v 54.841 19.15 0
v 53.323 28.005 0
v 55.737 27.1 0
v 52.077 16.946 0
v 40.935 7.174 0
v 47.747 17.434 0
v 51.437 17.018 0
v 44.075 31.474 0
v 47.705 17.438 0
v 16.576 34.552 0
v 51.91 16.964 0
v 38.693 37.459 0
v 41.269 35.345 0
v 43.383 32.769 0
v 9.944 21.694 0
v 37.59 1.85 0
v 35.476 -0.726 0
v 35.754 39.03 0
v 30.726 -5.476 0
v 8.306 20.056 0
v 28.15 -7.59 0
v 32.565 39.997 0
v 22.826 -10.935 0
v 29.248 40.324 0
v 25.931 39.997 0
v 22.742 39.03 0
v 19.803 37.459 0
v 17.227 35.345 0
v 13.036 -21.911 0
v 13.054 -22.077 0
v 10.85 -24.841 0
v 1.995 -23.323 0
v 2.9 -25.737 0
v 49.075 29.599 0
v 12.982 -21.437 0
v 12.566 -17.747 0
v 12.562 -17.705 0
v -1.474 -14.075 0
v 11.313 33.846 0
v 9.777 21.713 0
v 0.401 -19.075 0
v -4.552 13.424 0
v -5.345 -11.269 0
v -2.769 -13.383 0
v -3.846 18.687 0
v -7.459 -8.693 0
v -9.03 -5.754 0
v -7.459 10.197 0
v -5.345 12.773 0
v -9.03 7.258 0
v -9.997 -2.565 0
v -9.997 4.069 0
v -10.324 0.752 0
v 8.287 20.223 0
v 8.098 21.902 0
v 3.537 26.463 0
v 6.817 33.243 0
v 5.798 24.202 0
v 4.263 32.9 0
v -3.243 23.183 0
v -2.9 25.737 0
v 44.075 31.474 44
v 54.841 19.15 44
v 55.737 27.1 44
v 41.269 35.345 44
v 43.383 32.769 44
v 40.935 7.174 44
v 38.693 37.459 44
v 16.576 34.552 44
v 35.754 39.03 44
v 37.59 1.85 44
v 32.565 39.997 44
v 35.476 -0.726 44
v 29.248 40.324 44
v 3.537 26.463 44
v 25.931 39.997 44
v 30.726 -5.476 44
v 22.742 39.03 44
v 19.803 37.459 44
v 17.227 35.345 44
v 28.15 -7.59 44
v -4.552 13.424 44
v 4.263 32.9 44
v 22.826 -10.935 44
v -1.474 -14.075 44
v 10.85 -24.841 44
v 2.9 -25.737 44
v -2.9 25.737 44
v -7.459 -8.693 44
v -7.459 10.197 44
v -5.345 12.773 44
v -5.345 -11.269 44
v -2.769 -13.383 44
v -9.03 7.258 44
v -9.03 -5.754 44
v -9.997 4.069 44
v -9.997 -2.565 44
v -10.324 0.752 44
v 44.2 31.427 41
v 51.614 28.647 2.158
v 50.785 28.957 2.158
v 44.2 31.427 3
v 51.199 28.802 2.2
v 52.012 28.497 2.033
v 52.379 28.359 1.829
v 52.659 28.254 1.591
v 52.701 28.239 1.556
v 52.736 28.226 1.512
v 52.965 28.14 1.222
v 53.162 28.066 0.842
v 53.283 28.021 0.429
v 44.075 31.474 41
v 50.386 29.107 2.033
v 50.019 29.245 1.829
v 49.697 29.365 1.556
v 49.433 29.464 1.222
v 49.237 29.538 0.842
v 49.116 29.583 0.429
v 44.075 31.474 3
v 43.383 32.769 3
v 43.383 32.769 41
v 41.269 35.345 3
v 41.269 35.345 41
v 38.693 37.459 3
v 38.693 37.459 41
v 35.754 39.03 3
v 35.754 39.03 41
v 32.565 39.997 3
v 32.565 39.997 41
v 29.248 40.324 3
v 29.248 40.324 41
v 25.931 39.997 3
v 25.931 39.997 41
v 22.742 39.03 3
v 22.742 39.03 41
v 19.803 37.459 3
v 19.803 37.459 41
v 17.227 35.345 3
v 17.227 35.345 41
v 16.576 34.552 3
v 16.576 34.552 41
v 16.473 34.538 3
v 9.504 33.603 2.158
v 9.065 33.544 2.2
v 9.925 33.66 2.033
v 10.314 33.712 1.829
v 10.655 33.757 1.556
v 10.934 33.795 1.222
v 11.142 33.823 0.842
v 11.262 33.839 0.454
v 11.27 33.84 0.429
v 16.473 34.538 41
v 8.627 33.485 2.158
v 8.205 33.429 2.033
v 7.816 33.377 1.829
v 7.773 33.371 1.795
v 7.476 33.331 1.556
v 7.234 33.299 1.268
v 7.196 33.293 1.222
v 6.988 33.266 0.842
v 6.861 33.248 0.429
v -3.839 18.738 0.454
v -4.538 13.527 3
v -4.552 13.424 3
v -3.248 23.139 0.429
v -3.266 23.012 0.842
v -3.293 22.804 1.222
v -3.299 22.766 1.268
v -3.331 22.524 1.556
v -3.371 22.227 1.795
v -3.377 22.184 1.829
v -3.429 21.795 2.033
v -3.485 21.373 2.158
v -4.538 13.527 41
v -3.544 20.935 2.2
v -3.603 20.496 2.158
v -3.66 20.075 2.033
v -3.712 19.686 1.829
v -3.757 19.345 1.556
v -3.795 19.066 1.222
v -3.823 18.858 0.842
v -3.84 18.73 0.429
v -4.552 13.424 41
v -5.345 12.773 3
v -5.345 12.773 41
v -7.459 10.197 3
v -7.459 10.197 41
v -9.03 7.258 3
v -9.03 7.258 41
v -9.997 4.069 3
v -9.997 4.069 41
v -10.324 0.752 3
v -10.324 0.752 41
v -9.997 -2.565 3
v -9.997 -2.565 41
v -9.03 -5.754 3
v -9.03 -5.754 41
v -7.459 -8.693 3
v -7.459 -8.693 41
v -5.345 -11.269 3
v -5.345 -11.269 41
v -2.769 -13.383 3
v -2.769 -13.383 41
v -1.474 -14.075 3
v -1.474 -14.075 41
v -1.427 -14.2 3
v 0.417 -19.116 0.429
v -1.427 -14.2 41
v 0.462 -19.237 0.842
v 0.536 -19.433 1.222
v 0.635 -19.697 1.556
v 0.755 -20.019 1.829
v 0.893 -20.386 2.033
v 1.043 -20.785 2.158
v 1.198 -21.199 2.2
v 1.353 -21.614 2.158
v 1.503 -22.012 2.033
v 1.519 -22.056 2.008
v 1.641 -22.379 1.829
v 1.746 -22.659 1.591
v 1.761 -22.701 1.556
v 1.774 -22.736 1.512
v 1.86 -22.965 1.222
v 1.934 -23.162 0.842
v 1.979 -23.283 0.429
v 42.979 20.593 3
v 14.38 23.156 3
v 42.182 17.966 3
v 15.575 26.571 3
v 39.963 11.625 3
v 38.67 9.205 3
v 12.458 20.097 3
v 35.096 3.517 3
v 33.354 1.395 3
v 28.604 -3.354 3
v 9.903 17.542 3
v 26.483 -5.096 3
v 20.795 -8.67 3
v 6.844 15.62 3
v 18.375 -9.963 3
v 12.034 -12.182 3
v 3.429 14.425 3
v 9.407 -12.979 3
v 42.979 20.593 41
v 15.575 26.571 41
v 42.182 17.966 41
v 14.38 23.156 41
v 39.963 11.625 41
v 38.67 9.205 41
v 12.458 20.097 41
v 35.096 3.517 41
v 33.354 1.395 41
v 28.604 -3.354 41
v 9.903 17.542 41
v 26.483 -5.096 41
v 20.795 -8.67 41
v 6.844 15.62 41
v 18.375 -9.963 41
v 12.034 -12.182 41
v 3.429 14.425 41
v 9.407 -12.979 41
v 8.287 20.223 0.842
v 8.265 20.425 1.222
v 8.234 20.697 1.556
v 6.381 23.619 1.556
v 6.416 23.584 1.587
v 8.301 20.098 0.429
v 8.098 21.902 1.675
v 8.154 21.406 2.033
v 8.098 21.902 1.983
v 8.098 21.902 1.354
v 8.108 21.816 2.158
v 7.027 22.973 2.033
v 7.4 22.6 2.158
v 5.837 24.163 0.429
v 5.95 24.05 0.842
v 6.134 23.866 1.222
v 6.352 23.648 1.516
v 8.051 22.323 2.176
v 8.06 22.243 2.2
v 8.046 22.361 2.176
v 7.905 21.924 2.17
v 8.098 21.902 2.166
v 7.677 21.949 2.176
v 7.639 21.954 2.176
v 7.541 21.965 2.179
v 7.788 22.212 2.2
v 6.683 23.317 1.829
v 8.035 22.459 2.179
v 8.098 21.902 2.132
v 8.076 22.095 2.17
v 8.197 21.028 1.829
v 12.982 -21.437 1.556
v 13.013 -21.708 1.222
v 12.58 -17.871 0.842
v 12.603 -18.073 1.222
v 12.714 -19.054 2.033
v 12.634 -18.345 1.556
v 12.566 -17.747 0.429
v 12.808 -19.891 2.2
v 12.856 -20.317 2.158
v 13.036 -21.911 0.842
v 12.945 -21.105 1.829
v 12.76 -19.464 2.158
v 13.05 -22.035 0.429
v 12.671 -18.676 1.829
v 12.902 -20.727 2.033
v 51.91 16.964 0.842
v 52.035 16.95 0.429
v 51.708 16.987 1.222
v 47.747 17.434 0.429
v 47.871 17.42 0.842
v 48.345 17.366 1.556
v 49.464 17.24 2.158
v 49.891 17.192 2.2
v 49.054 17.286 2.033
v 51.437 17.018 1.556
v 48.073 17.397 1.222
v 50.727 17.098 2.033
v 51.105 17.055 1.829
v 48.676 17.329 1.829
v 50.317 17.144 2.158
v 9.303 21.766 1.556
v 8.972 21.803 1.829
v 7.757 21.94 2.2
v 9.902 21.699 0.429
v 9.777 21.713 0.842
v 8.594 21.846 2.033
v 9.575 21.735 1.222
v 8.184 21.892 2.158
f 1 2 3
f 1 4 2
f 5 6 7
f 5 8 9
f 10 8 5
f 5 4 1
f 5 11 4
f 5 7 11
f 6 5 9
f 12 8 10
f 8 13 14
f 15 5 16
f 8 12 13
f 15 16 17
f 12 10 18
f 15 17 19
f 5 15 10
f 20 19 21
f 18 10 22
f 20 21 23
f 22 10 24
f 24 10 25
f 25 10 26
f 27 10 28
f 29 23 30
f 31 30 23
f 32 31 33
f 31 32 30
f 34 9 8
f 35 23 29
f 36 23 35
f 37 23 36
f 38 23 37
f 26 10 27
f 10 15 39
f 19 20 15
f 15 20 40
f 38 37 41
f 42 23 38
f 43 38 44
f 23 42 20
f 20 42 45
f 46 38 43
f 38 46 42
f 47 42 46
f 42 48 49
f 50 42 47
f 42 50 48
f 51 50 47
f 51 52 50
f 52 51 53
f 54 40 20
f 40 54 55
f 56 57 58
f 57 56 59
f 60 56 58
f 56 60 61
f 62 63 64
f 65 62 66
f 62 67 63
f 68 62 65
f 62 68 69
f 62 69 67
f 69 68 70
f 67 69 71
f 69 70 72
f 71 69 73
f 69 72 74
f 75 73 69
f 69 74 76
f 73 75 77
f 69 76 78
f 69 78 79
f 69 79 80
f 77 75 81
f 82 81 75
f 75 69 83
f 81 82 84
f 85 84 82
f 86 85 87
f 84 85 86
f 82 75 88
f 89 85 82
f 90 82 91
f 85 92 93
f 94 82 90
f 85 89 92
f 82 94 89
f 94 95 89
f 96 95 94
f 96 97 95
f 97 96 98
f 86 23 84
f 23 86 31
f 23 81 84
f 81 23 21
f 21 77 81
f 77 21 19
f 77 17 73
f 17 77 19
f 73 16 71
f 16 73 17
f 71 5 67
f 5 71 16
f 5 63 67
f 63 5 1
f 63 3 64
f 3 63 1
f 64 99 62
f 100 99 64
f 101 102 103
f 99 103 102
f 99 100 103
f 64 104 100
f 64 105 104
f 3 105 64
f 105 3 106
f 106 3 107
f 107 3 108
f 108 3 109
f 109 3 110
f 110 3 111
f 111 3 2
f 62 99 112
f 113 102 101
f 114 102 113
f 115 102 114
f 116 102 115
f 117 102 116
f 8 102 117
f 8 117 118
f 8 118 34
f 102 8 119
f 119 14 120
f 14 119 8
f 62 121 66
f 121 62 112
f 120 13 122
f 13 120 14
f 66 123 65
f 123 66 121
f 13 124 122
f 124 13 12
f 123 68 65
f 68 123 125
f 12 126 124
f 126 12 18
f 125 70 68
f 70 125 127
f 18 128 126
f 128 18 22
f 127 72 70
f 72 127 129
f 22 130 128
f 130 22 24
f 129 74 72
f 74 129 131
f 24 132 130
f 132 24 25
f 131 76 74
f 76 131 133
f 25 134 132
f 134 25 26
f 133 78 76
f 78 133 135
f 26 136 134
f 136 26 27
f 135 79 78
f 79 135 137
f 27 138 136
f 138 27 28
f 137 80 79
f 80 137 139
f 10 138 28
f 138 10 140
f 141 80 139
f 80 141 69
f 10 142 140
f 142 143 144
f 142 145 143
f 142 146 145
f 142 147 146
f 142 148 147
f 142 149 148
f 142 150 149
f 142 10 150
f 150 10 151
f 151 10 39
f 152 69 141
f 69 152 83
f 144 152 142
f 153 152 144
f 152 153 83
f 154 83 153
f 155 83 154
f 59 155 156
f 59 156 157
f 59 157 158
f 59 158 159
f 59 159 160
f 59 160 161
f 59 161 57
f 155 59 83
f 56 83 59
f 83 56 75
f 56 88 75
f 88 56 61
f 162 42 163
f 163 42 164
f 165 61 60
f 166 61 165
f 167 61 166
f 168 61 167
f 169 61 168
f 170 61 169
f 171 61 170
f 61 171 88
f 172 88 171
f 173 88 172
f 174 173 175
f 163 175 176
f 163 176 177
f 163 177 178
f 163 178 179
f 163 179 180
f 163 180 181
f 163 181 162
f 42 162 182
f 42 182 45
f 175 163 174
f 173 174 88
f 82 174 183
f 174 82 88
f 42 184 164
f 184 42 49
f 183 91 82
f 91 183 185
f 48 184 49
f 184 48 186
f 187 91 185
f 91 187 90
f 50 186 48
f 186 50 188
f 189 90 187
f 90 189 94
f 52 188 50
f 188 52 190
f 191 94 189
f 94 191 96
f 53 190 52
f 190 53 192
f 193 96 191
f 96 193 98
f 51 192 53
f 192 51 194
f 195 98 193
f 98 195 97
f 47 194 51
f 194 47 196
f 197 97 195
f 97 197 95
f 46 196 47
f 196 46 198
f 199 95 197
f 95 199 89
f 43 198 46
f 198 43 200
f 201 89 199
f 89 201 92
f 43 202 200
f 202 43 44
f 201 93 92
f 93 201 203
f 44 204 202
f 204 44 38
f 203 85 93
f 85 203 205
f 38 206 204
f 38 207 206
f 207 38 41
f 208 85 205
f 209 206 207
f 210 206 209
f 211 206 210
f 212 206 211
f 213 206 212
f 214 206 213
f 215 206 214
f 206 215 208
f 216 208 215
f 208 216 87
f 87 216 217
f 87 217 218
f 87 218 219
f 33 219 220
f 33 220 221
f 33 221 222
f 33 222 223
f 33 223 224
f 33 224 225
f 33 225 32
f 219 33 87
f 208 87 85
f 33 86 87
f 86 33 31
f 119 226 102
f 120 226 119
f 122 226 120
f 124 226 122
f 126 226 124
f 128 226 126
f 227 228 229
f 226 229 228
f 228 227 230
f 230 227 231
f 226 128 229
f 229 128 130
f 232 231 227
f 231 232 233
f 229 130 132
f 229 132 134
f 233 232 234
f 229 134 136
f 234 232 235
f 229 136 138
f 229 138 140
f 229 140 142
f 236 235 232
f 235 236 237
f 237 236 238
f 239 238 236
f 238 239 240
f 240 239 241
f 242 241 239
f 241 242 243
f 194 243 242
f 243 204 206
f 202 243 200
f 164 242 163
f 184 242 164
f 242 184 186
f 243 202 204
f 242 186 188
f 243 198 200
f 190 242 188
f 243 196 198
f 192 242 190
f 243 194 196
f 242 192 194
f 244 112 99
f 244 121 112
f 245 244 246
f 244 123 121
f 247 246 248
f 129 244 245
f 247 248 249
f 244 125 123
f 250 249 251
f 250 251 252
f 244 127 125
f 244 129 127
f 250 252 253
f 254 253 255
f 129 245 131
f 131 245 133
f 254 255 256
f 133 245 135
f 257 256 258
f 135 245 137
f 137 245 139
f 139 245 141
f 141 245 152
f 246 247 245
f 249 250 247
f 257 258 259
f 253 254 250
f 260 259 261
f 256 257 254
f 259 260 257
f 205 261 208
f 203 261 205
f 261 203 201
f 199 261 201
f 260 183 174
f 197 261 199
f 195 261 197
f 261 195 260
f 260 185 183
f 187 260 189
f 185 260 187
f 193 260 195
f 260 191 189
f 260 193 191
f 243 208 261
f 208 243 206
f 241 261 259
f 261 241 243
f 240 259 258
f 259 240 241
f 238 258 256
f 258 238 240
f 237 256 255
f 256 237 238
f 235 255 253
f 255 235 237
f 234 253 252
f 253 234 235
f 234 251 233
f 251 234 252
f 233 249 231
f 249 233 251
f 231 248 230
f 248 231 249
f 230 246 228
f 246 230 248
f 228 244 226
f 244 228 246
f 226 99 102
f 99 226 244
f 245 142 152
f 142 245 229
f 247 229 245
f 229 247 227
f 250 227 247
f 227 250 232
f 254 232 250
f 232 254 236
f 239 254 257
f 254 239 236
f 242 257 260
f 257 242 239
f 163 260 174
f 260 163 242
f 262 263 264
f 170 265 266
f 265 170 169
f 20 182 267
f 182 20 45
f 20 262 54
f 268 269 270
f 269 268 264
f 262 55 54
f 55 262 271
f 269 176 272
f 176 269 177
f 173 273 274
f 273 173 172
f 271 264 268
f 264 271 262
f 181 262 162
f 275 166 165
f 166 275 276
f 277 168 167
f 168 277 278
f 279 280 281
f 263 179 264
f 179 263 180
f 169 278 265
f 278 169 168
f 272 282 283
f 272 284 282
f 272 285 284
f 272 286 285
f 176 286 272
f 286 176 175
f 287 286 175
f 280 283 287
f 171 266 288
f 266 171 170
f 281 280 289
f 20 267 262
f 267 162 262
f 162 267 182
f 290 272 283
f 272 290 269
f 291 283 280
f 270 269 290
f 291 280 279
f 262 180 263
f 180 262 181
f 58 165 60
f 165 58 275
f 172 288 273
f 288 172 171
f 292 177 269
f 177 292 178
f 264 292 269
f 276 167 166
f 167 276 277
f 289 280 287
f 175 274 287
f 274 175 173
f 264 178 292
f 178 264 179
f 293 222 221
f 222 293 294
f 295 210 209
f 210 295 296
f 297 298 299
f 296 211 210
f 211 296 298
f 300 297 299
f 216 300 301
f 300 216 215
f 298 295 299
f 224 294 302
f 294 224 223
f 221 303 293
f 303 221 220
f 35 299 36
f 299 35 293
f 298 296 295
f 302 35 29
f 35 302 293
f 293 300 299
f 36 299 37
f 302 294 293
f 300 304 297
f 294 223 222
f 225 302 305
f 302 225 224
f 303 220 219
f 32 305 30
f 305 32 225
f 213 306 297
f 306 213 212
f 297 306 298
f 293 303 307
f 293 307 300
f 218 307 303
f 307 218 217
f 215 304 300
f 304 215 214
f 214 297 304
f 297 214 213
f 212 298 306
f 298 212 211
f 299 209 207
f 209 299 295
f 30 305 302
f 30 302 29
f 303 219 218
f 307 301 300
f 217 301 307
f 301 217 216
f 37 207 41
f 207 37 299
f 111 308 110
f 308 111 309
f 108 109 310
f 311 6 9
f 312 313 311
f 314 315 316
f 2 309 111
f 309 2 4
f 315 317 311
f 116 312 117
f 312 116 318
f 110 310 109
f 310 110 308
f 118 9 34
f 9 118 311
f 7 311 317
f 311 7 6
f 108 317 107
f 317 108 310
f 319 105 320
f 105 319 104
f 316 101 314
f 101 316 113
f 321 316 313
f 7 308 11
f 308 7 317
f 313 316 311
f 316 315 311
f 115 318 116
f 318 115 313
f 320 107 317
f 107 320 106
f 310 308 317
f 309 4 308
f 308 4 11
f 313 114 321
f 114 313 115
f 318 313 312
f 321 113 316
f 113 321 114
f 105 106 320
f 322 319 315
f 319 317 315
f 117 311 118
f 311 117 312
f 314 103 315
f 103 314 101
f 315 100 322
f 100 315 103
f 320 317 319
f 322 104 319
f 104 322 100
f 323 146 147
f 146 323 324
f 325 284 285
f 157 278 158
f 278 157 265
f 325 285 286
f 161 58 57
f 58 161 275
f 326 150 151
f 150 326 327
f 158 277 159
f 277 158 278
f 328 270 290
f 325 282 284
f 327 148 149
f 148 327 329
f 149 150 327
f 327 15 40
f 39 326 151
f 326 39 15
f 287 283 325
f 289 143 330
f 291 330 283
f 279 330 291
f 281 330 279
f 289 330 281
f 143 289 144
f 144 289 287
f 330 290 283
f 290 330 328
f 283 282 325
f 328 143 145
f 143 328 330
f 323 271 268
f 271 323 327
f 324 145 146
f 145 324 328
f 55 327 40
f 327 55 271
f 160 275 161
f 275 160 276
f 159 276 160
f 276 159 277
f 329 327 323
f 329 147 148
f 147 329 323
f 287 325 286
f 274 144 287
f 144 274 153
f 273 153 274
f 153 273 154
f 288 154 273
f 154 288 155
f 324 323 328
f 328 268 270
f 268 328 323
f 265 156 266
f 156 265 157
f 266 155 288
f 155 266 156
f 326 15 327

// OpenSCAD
$fn = 32;

// ----------------------------------------------------------------------
// Air duct: 34 mm duct, 3 mm wall, 44 mm across
// ----------------------------------------------------------------------

// --- parameters (mm) ---
duct_r = 17;              // duct core radius
duct_d = 34;              // duct core diameter
wall = 3;                 // duct wall thickness
height = 44;              // duct width (extrusion height)
port_r = 25.9;            // port flange half width
port_d = 51.8;            // port flange width
port_t = 8;               // port flange thickness
bolt_d = 4.4;             // port bolt holes
bolt_offset = 21.2;       // bolt hole offset from the port axis

difference() {
  /* outer hull chain: tube with a flat flange plate at every port */
  linear_extrude(height = 44) {
    hull() {
      polygon([[2.9, -25.737], [-2.9, 25.737], [5.05, 26.633], [10.85, -24.841]]);
      translate([10.931, 1.232]) circle(r = 17);
    }
    hull() {
      translate([10.931, 1.232]) circle(r = 17);
      translate([6.676, 0.752]) circle(r = 17);
    }
    hull() {
      translate([6.676, 0.752]) circle(r = 17);
      translate([13.017, 2.971]) circle(r = 17);
    }
    hull() {
      translate([13.017, 2.971]) circle(r = 17);
      translate([18.705, 6.545]) circle(r = 17);
    }
    hull() {
      translate([18.705, 6.545]) circle(r = 17);
      translate([23.455, 11.295]) circle(r = 17);
    }
    hull() {
      translate([23.455, 11.295]) circle(r = 17);
      translate([27.029, 16.983]) circle(r = 17);
    }
    hull() {
      translate([27.029, 16.983]) circle(r = 17);
      translate([29.248, 23.324]) circle(r = 17);
    }
    hull() {
      translate([29.248, 23.324]) circle(r = 17);
      translate([28.768, 19.069]) circle(r = 17);
    }
    hull() {
      translate([28.768, 19.069]) circle(r = 17);
      polygon([[4.263, 32.9], [55.737, 27.1], [54.841, 19.15], [3.367, 24.95]]);
    }
  }
  /* air passage: the same chain inset by the wall, 5 mm proud of the ports */
  translate([0, 0, 3]) linear_extrude(height = 38) {
    hull() {
      translate([-4.969, -0.56]) circle(r = 14);
      translate([6.676, 0.752]) circle(r = 14);
    }
    hull() {
      translate([6.676, 0.752]) circle(r = 14);
      translate([13.017, 2.971]) circle(r = 14);
    }
    hull() {
      translate([13.017, 2.971]) circle(r = 14);
      translate([18.705, 6.545]) circle(r = 14);
    }
    hull() {
      translate([18.705, 6.545]) circle(r = 14);
      translate([23.455, 11.295]) circle(r = 14);
    }
    hull() {
      translate([23.455, 11.295]) circle(r = 14);
      translate([27.029, 16.983]) circle(r = 14);
    }
    hull() {
      translate([27.029, 16.983]) circle(r = 14);
      translate([29.248, 23.324]) circle(r = 14);
    }
    hull() {
      translate([29.248, 23.324]) circle(r = 14);
      translate([30.56, 34.969]) circle(r = 14);
    }
  }
  translate([0, 0]) rotate([0, 0, -83.57]) translate([-21.2, -2.5]) rotate([-90, 0, 0]) cylinder(h = 13, d = 4.4);
  translate([0, 0]) rotate([0, 0, -83.57]) translate([21.2, -2.5]) rotate([-90, 0, 0]) cylinder(h = 13, d = 4.4);
  translate([30, 30]) rotate([0, 0, 173.57]) translate([-21.2, -2.5]) rotate([-90, 0, 0]) cylinder(h = 13, d = 4.4);
  translate([30, 30]) rotate([0, 0, 173.57]) translate([21.2, -2.5]) rotate([-90, 0, 0]) cylinder(h = 13, d = 4.4);
}
